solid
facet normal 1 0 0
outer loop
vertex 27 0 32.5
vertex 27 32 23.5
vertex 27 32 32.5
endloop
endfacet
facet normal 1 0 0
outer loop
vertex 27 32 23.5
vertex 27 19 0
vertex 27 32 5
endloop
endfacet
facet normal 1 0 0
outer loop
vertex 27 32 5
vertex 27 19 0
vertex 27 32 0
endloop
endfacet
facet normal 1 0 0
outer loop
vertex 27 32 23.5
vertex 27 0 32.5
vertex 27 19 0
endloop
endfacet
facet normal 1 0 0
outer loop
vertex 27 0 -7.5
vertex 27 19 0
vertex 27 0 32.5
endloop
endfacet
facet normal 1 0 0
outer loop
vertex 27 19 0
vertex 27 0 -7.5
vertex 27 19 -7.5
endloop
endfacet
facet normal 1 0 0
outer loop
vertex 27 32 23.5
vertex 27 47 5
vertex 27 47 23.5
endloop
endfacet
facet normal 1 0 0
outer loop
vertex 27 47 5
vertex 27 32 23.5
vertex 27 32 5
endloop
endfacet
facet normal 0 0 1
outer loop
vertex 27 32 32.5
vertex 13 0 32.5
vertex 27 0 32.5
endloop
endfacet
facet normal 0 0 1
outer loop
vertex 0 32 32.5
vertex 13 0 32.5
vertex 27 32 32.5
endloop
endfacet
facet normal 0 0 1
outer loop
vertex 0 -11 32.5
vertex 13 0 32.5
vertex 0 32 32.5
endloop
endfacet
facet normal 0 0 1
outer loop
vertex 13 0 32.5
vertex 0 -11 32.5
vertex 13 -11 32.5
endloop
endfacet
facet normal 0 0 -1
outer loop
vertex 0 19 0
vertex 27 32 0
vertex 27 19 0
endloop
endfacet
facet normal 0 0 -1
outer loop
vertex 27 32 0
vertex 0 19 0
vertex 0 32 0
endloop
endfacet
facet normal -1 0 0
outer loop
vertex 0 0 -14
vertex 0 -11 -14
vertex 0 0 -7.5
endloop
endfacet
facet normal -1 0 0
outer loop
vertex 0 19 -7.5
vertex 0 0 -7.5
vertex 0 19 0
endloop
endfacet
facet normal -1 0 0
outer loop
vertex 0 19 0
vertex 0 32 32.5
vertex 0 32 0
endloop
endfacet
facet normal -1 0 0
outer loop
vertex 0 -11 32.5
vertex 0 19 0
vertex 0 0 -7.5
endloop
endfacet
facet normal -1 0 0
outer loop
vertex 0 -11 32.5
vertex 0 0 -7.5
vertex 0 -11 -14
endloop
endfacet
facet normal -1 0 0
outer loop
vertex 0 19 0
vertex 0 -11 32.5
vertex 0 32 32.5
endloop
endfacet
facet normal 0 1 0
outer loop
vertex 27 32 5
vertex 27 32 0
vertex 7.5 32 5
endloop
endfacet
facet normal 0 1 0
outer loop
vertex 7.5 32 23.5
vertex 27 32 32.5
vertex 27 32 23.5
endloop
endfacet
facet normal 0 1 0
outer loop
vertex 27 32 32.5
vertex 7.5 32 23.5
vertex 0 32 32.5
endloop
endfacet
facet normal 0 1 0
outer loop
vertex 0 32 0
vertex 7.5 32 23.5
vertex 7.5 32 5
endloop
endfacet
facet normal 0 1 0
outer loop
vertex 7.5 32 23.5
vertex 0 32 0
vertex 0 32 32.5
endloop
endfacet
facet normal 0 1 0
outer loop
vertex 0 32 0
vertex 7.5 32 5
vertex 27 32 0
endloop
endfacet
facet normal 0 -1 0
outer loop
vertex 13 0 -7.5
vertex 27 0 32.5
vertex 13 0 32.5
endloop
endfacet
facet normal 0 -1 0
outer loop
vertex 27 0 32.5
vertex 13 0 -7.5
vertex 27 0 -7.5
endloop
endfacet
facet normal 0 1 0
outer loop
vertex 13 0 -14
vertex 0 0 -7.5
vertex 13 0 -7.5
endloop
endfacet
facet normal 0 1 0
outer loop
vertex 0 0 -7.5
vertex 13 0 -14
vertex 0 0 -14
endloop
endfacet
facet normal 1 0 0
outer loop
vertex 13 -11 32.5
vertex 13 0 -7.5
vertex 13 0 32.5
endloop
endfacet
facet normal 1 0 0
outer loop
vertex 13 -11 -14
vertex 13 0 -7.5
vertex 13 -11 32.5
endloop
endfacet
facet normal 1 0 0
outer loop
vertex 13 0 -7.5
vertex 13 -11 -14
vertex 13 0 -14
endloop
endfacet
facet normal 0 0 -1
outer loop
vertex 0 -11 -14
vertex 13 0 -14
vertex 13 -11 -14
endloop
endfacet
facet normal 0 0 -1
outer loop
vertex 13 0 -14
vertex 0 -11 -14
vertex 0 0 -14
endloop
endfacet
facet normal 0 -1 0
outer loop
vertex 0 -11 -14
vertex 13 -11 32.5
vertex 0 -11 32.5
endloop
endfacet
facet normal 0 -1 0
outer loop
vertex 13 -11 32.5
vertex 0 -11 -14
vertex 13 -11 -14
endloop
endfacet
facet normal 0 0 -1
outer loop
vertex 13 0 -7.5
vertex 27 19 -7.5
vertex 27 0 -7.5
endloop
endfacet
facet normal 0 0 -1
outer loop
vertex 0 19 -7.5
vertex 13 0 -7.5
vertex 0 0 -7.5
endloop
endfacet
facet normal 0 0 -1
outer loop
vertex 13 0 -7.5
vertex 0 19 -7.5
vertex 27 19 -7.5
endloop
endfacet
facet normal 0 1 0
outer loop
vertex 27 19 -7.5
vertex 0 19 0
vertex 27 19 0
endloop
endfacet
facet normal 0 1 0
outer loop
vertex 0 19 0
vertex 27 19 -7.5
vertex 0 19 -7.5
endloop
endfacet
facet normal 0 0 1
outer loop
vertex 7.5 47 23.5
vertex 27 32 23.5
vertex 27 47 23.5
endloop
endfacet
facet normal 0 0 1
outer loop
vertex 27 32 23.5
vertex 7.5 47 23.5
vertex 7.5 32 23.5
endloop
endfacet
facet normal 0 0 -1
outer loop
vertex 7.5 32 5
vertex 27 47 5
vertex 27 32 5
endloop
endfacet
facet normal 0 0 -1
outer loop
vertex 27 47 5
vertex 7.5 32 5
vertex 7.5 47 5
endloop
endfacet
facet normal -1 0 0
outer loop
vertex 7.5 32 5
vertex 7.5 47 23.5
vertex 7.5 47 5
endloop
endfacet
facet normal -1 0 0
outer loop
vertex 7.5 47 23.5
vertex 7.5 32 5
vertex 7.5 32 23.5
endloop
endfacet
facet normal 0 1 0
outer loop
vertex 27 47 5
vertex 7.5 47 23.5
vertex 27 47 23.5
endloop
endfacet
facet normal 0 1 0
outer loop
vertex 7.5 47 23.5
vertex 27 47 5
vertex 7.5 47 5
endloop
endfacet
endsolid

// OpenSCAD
cube(size = [27,32,32.5]);
translate([0, -11, -14]) {
  cube(size = [13,11,46.5]);
}
translate([0, 0, -7.5]) {
  cube(size = [27,19,7.5]);
}
translate([7.5, 32, 5]) {
  cube(size = [19.5,15,18.5]);
}
